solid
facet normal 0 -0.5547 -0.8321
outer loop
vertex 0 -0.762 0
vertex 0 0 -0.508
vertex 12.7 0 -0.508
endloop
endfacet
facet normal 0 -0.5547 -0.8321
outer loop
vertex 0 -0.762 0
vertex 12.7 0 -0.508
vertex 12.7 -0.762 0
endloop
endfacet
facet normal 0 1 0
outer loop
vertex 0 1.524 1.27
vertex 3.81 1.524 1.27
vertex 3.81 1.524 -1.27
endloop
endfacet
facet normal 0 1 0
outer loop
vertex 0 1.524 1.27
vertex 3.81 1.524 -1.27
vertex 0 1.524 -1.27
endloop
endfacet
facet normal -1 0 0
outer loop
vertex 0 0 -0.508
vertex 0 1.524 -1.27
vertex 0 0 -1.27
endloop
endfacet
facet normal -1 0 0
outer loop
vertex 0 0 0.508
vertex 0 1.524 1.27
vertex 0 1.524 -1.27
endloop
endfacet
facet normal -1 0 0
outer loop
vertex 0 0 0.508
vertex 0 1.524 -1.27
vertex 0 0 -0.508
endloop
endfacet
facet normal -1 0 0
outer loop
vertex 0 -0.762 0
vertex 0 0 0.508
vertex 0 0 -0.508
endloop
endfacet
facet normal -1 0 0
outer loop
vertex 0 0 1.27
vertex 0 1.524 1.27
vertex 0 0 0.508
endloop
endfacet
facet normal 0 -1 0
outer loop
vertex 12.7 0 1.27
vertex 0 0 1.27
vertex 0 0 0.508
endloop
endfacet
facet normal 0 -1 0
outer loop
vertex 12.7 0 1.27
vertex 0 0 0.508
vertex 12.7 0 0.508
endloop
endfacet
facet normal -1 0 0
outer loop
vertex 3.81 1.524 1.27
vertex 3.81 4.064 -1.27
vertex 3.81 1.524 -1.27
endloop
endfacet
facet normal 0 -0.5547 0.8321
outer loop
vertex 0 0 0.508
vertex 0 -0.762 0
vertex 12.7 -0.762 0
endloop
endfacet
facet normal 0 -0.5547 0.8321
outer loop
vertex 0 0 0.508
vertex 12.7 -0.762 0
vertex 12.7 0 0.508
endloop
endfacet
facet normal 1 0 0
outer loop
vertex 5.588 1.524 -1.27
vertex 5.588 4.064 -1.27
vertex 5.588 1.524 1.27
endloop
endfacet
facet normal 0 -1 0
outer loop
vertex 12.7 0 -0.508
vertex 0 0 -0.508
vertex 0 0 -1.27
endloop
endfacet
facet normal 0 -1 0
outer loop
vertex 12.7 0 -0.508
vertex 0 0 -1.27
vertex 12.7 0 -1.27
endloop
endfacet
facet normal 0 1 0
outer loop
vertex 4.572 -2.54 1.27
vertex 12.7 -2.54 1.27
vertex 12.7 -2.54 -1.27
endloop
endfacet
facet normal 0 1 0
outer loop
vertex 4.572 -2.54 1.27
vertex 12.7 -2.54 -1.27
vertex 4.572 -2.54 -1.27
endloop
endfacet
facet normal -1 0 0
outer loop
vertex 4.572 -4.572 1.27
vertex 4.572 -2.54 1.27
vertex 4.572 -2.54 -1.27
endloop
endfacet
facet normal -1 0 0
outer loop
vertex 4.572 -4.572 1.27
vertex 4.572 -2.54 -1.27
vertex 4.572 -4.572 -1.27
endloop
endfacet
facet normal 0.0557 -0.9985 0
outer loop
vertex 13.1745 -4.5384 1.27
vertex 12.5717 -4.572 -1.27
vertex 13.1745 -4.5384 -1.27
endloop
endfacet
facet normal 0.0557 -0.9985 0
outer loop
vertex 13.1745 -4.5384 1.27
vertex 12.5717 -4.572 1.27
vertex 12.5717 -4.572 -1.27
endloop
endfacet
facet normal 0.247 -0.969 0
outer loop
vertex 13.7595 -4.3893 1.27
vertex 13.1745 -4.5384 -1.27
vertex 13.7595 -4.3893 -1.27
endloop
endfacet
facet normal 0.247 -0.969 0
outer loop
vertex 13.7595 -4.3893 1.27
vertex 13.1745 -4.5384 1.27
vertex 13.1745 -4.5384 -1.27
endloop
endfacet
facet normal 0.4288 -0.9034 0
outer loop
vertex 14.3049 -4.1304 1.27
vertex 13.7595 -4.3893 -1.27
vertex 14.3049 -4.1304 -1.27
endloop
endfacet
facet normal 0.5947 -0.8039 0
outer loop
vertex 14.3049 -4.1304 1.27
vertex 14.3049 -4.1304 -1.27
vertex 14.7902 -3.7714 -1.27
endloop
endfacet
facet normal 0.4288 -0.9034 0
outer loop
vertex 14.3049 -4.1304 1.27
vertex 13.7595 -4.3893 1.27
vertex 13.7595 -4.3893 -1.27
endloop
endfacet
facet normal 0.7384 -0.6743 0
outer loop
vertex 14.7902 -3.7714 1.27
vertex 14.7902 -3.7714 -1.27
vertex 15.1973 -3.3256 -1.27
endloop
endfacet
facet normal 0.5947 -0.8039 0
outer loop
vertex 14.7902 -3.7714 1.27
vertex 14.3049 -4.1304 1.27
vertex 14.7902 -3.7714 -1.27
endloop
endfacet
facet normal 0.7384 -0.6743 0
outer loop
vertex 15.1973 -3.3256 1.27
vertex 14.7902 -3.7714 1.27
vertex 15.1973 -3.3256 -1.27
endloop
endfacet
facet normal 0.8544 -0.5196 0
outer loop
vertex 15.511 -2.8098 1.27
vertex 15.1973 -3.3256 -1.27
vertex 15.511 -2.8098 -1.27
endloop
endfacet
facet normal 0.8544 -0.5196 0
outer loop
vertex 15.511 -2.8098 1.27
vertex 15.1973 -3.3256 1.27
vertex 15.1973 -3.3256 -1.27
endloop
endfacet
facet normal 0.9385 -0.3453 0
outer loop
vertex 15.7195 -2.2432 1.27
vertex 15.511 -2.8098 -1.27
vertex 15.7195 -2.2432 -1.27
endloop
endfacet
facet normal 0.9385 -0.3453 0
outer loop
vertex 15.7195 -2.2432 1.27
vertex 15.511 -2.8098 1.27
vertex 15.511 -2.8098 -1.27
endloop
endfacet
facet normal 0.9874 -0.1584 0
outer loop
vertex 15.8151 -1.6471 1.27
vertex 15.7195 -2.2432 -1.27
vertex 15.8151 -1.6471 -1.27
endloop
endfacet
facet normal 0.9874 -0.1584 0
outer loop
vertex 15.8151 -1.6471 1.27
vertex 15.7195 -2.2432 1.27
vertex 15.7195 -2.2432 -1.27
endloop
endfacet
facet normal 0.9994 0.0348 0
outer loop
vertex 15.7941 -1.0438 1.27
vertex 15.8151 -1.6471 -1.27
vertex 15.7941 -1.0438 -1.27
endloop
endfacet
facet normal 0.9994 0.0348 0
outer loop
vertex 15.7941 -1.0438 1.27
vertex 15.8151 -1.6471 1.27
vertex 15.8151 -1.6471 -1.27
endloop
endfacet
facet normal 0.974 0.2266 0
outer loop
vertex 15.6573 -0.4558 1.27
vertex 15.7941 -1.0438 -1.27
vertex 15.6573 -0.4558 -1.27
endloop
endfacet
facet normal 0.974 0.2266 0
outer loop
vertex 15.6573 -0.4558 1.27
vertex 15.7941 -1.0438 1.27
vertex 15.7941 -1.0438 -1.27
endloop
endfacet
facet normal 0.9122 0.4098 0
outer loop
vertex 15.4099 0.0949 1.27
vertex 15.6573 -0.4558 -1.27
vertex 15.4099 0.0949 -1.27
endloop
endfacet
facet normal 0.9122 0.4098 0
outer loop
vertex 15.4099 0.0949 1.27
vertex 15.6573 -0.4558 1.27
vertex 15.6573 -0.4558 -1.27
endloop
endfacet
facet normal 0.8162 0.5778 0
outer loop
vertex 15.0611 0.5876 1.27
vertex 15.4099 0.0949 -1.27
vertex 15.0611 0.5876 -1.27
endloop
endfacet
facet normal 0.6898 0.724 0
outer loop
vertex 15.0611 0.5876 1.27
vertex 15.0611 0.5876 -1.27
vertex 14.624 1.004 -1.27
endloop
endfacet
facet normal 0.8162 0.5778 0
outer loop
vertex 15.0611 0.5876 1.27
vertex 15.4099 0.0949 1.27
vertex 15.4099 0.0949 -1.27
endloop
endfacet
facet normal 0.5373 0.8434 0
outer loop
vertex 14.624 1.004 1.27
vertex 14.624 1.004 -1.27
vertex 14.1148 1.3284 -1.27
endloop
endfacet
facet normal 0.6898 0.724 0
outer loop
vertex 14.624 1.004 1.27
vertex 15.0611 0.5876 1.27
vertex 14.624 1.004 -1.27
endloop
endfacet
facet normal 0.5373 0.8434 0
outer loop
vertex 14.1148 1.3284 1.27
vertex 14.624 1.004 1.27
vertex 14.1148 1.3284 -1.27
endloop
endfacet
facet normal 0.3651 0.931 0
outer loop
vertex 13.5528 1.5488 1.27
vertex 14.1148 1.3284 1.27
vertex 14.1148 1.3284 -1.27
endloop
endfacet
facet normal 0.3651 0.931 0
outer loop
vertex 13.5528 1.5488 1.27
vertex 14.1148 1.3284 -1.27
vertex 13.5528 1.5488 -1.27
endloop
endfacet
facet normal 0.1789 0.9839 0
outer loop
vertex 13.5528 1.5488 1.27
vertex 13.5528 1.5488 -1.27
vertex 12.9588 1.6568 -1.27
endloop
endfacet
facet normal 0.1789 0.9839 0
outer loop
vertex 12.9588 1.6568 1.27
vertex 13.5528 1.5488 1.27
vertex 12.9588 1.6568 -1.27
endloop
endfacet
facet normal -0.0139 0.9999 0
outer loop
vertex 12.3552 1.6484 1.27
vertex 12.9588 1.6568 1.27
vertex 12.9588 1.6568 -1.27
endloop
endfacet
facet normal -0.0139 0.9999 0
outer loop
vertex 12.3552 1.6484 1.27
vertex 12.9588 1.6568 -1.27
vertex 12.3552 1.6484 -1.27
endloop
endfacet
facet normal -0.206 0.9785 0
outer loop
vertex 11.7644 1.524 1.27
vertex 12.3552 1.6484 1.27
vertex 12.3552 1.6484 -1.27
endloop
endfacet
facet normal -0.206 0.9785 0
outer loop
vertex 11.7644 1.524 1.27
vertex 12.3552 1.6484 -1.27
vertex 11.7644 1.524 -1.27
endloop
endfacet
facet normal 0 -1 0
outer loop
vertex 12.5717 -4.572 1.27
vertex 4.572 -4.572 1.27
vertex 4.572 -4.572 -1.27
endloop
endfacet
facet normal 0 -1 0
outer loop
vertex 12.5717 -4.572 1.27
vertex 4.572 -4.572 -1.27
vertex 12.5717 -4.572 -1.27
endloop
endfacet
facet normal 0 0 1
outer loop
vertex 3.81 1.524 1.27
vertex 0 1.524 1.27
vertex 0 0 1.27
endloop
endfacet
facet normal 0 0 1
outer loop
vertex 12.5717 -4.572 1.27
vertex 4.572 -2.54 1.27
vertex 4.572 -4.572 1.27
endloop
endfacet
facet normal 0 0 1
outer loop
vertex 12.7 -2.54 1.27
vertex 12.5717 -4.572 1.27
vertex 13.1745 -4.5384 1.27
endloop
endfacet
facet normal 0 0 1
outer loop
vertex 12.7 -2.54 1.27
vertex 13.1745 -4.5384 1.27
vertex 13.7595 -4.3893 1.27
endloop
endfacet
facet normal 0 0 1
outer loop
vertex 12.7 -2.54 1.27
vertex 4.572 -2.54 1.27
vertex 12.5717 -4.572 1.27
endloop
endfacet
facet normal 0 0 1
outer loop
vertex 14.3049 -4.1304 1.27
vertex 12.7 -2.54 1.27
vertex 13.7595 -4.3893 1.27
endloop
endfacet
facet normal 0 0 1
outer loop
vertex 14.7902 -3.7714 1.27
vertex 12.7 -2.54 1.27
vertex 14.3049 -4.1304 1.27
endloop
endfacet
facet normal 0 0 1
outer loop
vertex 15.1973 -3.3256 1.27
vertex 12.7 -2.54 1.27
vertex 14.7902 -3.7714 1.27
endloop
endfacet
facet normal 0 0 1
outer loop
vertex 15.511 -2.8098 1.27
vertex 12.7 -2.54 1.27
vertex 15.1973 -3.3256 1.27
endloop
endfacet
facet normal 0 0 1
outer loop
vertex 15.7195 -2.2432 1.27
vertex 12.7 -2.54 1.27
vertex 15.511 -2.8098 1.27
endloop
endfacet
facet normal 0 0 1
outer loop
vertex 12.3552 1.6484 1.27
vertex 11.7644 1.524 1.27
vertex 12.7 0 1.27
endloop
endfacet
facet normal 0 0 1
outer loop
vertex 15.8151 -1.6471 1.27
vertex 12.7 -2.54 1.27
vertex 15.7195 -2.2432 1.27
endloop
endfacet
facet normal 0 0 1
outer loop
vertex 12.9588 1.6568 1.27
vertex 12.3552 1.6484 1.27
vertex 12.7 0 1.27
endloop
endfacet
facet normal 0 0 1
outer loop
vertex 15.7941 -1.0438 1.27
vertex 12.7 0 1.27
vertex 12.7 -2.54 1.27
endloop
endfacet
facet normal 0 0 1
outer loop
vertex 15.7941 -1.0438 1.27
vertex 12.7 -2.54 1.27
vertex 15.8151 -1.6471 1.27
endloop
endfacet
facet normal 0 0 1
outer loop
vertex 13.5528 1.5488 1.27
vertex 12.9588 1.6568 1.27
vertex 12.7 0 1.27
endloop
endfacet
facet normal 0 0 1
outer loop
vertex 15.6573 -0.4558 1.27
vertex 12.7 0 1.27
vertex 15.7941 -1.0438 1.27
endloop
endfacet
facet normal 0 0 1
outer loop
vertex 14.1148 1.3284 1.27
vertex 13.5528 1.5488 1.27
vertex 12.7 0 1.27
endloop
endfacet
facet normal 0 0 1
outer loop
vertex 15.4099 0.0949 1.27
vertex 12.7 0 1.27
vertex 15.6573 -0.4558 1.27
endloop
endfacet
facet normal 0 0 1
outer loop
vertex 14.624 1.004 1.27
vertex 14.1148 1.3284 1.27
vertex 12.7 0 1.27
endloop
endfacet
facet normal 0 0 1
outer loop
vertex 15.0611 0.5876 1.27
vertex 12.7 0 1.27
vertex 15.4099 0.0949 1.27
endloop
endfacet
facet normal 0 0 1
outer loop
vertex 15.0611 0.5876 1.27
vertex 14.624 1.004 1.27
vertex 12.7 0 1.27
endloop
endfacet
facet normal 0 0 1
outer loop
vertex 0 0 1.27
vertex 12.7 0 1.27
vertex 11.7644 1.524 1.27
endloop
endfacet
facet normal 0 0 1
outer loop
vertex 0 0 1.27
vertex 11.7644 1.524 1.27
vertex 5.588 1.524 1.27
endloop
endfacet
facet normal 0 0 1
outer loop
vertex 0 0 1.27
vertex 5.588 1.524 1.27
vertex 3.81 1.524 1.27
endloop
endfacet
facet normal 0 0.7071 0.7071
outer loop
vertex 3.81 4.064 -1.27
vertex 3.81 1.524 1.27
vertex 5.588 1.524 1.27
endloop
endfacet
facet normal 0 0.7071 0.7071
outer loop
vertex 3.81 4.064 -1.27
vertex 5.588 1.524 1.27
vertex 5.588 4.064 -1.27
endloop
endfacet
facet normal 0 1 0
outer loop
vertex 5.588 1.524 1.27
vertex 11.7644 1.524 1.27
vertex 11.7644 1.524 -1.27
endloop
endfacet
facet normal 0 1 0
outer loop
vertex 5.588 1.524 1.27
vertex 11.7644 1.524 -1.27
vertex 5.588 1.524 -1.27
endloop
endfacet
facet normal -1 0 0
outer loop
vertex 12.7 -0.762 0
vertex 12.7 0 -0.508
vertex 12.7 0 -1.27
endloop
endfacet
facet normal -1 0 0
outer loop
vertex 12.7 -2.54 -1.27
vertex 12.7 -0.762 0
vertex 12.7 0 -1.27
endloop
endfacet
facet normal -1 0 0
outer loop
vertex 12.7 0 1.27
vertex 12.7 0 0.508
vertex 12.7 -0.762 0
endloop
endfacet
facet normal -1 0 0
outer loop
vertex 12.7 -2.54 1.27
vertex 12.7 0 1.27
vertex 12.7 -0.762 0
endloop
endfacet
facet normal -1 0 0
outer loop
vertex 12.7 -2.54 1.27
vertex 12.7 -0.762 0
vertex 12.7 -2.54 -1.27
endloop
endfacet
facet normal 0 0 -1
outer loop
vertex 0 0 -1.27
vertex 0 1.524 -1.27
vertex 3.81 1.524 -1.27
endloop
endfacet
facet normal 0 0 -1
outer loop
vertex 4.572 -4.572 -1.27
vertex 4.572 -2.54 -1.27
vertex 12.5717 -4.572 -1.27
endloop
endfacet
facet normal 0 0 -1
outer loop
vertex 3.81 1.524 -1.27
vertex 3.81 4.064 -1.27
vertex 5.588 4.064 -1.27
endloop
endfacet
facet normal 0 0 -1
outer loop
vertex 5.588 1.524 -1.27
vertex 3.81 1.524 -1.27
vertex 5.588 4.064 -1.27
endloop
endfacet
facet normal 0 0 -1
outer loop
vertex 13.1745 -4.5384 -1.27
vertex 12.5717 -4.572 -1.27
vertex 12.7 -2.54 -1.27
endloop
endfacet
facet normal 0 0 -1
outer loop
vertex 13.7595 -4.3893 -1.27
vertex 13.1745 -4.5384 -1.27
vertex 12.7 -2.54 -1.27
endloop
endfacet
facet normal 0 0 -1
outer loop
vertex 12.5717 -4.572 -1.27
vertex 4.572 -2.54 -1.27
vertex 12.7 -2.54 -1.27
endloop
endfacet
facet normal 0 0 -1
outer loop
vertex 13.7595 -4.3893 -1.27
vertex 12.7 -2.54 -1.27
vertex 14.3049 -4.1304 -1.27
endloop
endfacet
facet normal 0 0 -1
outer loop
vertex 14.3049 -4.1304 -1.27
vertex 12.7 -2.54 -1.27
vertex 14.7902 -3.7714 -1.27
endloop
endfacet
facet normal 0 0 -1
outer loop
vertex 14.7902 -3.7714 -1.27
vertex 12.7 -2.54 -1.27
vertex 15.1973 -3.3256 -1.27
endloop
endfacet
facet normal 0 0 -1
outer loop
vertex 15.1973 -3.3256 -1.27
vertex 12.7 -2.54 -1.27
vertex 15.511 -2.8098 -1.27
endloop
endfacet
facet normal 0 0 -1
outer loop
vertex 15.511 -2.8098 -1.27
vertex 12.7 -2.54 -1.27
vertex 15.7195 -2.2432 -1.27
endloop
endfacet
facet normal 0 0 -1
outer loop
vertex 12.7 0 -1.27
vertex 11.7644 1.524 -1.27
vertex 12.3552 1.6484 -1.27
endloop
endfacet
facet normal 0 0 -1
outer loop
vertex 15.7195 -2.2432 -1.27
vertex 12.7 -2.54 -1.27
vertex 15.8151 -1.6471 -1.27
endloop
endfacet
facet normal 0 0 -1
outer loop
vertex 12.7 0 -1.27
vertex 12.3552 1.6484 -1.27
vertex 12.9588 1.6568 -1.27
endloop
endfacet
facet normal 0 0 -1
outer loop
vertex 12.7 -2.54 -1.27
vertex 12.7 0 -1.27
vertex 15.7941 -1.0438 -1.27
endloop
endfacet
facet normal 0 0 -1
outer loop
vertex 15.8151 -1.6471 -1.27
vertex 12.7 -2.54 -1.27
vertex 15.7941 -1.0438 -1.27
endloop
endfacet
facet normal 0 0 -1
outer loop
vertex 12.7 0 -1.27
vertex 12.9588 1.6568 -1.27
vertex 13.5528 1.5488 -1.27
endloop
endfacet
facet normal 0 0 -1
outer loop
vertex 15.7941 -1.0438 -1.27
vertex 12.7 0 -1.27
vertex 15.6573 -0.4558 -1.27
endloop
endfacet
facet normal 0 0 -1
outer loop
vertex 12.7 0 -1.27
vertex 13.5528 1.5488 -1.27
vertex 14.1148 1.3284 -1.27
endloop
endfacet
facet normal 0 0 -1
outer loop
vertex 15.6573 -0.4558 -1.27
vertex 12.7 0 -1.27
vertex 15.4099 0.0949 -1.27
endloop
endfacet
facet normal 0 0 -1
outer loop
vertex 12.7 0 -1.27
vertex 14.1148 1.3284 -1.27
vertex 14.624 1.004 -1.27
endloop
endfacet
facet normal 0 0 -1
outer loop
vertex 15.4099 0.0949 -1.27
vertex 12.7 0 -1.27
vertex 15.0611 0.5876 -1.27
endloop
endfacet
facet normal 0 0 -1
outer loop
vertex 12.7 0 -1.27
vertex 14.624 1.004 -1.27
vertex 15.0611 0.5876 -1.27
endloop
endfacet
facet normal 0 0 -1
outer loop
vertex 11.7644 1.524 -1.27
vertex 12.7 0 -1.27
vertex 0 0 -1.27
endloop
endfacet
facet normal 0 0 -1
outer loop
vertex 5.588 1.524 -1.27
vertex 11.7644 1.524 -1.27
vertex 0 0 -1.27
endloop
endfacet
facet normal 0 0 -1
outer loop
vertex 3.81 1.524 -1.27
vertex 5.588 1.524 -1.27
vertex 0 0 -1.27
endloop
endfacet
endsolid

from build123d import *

# Parameters (mm, degrees)
F1_DEPTH = 1.27
F3_DEPTH = 12.7
F6_DEPTH = 1.778


with BuildPart() as f1:
    # F0 (on Top) → F1 (new body, symmetric)
    with BuildSketch(Plane.XY):
        with BuildLine():
            Line((0, 1.524), (0, 0))
            Line((0, 0), (12.7, 0))
            Line((12.7, 0), (12.7, -2.54))
            Line((12.7, -2.54), (4.572, -2.54))
            Line((4.572, -2.54), (4.572, -4.572))
            Line((4.572, -4.572), (12.5717104354, -4.572))
            ThreePointArc((12.5717104354, -4.572), (15.7940682602, -1.0438103752), (11.7644204026, 1.524))
            Line((11.7644204026, 1.524), (0, 1.524))
        make_face()
    extrude(amount=F1_DEPTH, both=True)

    # F2 (on face) → F3 (join, through all)
    with BuildSketch(Plane(origin=(0, 0, 0), x_dir=(0, -1, 0), z_dir=(-1, 0, 0))):
        Polygon((0.762, 0), (0, 0.508), (0, -0.508), align=None)
    extrude(amount=-F3_DEPTH)

    # F5 (on face) → F6 (join)
    with BuildSketch(Plane(origin=(3.81, 0, 0), x_dir=(0, -1, 0), z_dir=(-1, 0, 0))):
        Polygon((-4.064, -1.27), (-1.524, -1.27), (-1.524, 1.27), align=None)
    extrude(amount=-F6_DEPTH)


solid = f1.part
